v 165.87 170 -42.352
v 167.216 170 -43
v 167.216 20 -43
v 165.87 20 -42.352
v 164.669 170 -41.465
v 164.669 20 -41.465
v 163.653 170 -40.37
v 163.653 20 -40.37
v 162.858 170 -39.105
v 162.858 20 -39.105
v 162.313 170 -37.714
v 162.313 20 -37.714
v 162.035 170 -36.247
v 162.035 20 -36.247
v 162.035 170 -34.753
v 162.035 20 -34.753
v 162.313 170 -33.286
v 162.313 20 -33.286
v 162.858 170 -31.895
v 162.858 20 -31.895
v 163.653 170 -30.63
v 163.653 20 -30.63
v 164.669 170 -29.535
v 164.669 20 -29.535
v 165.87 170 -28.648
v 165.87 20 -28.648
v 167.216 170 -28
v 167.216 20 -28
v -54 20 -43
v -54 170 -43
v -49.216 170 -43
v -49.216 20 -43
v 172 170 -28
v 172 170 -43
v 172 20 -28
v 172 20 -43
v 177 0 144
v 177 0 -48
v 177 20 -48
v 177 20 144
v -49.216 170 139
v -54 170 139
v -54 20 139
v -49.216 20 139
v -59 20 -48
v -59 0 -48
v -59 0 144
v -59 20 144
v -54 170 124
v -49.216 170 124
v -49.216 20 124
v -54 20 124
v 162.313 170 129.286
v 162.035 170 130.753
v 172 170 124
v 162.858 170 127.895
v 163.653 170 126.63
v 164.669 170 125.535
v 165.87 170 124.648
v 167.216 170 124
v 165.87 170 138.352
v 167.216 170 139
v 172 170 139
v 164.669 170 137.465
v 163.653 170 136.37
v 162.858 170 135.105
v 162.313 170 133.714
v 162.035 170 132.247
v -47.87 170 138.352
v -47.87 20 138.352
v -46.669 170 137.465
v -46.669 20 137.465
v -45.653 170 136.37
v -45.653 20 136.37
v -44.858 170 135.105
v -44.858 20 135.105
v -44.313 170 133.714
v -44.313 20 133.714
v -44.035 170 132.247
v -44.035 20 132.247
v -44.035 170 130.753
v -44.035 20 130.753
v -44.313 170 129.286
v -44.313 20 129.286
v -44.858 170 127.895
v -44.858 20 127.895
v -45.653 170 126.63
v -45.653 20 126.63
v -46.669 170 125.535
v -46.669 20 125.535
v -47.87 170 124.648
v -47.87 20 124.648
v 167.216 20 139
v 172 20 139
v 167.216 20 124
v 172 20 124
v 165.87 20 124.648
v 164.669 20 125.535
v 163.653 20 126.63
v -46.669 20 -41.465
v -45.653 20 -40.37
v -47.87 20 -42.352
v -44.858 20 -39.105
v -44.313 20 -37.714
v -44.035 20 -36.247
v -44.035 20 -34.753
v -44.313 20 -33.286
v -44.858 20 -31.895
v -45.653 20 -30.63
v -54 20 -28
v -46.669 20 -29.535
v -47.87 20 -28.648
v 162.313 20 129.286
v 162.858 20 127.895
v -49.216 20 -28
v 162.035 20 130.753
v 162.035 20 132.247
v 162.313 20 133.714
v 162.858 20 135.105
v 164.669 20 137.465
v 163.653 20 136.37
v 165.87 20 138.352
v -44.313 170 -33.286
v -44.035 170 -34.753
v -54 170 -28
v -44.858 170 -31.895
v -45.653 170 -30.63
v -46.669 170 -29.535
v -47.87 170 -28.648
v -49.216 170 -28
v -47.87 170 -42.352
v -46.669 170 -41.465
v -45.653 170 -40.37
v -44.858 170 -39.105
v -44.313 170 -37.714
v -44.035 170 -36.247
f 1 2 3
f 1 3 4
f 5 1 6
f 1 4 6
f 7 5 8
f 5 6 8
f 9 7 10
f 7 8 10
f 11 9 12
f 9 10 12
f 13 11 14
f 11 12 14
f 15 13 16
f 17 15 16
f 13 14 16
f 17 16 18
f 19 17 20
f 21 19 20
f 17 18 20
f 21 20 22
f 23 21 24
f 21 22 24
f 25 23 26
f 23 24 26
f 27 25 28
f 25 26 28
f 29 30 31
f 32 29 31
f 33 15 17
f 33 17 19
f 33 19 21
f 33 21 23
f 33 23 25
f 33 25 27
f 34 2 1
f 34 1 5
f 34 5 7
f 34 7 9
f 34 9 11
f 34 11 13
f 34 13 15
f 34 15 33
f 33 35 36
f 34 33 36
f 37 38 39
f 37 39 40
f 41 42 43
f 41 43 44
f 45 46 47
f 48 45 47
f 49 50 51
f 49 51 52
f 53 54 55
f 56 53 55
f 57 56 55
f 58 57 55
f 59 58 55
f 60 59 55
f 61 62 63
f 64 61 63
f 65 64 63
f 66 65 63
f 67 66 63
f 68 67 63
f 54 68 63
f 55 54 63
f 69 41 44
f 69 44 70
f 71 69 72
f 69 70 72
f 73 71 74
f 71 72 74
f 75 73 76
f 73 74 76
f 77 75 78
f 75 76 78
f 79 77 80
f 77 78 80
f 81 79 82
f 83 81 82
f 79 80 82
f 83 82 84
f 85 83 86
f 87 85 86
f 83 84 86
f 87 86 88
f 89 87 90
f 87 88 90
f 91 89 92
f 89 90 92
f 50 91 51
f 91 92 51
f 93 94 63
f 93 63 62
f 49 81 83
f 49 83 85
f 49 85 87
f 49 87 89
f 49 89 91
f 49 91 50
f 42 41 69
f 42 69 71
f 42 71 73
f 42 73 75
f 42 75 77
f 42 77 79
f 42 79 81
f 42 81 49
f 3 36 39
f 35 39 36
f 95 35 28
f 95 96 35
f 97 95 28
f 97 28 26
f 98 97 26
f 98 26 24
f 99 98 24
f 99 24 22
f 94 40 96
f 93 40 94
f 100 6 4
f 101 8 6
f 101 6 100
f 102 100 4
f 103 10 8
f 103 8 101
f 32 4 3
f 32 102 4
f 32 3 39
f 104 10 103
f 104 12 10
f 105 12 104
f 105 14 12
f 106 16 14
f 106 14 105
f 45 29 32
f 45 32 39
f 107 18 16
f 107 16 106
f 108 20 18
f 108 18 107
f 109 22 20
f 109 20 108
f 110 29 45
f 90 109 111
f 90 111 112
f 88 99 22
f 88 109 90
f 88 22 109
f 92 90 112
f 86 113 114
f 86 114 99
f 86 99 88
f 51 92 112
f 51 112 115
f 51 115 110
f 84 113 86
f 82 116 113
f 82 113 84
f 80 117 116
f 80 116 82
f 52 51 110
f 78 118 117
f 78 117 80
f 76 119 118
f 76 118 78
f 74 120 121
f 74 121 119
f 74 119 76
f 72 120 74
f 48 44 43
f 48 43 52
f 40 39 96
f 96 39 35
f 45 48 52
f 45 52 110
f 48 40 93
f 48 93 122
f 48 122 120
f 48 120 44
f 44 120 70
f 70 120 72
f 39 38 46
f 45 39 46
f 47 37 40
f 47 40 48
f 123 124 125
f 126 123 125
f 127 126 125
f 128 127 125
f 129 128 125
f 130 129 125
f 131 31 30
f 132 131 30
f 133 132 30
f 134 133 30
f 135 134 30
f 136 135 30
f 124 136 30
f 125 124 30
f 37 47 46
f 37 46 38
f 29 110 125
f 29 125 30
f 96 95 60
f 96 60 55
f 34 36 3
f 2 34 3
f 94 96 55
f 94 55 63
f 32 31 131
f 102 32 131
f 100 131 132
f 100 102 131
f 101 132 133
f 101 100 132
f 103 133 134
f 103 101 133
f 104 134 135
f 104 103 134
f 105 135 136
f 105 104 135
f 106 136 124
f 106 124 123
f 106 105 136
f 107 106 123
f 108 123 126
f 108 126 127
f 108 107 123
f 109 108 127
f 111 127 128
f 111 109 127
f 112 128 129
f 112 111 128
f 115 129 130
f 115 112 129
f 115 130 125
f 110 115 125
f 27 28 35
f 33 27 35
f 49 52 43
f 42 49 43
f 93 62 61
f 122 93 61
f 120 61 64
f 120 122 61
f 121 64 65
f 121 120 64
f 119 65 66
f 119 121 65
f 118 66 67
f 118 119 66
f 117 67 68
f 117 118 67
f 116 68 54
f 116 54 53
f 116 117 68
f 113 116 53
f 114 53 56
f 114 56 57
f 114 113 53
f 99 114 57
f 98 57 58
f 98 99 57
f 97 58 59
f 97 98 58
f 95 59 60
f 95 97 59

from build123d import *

# Parameters (mm, degrees)
SCHIZZO2_W                   = 118
SCHIZZO2_H                   = 96
ESTRUSIONE_ESTRUSIONE1_DEPTH = 20
ESTRUSIONE_ESTRUSIONE2_DEPTH = 170


with BuildPart() as part:
    # Schizzo2 → Estrusione-Estrusione1 (new body)
    with BuildSketch(Plane(origin=(0, 0, 0), x_dir=(1, 0, 0), z_dir=(0, 1, 0))):
        Rectangle(SCHIZZO2_W, SCHIZZO2_H)
    extrude(amount=ESTRUSIONE_ESTRUSIONE1_DEPTH)

    # Schizzo3 → Estrusione-Estrusione2 (add)
    with BuildSketch(Plane(origin=(0, 0, 0), x_dir=(1, 0, 0), z_dir=(0, 1, 0))):
        with BuildLine():
            Line((-49.216117819, 28), (-54, 28))
            Line((-54, 28), (-54, 43))
            Line((-54, 43), (-49.216117819, 43))
            ThreePointArc((-49.216117819, 43), (-44, 35.5), (-49.216117819, 28))
        make_face()
    extrude(amount=ESTRUSIONE_ESTRUSIONE2_DEPTH)

    # Specchia3: part across plane


with BuildPart() as part_1:
    add(part.part)
    add(part.part.mirror(Plane(origin=(-59, 20, 48), x_dir=(1, 0, 0), z_dir=(0, 0, -1))))

    # Specchia2: part across plane


with BuildPart() as part_2:
    add(part_1.part)
    add(part_1.part.mirror(Plane(origin=(59, 20, -48), x_dir=(0, 0, 1), z_dir=(-1, 0, 0))))


solid = part_2.part
